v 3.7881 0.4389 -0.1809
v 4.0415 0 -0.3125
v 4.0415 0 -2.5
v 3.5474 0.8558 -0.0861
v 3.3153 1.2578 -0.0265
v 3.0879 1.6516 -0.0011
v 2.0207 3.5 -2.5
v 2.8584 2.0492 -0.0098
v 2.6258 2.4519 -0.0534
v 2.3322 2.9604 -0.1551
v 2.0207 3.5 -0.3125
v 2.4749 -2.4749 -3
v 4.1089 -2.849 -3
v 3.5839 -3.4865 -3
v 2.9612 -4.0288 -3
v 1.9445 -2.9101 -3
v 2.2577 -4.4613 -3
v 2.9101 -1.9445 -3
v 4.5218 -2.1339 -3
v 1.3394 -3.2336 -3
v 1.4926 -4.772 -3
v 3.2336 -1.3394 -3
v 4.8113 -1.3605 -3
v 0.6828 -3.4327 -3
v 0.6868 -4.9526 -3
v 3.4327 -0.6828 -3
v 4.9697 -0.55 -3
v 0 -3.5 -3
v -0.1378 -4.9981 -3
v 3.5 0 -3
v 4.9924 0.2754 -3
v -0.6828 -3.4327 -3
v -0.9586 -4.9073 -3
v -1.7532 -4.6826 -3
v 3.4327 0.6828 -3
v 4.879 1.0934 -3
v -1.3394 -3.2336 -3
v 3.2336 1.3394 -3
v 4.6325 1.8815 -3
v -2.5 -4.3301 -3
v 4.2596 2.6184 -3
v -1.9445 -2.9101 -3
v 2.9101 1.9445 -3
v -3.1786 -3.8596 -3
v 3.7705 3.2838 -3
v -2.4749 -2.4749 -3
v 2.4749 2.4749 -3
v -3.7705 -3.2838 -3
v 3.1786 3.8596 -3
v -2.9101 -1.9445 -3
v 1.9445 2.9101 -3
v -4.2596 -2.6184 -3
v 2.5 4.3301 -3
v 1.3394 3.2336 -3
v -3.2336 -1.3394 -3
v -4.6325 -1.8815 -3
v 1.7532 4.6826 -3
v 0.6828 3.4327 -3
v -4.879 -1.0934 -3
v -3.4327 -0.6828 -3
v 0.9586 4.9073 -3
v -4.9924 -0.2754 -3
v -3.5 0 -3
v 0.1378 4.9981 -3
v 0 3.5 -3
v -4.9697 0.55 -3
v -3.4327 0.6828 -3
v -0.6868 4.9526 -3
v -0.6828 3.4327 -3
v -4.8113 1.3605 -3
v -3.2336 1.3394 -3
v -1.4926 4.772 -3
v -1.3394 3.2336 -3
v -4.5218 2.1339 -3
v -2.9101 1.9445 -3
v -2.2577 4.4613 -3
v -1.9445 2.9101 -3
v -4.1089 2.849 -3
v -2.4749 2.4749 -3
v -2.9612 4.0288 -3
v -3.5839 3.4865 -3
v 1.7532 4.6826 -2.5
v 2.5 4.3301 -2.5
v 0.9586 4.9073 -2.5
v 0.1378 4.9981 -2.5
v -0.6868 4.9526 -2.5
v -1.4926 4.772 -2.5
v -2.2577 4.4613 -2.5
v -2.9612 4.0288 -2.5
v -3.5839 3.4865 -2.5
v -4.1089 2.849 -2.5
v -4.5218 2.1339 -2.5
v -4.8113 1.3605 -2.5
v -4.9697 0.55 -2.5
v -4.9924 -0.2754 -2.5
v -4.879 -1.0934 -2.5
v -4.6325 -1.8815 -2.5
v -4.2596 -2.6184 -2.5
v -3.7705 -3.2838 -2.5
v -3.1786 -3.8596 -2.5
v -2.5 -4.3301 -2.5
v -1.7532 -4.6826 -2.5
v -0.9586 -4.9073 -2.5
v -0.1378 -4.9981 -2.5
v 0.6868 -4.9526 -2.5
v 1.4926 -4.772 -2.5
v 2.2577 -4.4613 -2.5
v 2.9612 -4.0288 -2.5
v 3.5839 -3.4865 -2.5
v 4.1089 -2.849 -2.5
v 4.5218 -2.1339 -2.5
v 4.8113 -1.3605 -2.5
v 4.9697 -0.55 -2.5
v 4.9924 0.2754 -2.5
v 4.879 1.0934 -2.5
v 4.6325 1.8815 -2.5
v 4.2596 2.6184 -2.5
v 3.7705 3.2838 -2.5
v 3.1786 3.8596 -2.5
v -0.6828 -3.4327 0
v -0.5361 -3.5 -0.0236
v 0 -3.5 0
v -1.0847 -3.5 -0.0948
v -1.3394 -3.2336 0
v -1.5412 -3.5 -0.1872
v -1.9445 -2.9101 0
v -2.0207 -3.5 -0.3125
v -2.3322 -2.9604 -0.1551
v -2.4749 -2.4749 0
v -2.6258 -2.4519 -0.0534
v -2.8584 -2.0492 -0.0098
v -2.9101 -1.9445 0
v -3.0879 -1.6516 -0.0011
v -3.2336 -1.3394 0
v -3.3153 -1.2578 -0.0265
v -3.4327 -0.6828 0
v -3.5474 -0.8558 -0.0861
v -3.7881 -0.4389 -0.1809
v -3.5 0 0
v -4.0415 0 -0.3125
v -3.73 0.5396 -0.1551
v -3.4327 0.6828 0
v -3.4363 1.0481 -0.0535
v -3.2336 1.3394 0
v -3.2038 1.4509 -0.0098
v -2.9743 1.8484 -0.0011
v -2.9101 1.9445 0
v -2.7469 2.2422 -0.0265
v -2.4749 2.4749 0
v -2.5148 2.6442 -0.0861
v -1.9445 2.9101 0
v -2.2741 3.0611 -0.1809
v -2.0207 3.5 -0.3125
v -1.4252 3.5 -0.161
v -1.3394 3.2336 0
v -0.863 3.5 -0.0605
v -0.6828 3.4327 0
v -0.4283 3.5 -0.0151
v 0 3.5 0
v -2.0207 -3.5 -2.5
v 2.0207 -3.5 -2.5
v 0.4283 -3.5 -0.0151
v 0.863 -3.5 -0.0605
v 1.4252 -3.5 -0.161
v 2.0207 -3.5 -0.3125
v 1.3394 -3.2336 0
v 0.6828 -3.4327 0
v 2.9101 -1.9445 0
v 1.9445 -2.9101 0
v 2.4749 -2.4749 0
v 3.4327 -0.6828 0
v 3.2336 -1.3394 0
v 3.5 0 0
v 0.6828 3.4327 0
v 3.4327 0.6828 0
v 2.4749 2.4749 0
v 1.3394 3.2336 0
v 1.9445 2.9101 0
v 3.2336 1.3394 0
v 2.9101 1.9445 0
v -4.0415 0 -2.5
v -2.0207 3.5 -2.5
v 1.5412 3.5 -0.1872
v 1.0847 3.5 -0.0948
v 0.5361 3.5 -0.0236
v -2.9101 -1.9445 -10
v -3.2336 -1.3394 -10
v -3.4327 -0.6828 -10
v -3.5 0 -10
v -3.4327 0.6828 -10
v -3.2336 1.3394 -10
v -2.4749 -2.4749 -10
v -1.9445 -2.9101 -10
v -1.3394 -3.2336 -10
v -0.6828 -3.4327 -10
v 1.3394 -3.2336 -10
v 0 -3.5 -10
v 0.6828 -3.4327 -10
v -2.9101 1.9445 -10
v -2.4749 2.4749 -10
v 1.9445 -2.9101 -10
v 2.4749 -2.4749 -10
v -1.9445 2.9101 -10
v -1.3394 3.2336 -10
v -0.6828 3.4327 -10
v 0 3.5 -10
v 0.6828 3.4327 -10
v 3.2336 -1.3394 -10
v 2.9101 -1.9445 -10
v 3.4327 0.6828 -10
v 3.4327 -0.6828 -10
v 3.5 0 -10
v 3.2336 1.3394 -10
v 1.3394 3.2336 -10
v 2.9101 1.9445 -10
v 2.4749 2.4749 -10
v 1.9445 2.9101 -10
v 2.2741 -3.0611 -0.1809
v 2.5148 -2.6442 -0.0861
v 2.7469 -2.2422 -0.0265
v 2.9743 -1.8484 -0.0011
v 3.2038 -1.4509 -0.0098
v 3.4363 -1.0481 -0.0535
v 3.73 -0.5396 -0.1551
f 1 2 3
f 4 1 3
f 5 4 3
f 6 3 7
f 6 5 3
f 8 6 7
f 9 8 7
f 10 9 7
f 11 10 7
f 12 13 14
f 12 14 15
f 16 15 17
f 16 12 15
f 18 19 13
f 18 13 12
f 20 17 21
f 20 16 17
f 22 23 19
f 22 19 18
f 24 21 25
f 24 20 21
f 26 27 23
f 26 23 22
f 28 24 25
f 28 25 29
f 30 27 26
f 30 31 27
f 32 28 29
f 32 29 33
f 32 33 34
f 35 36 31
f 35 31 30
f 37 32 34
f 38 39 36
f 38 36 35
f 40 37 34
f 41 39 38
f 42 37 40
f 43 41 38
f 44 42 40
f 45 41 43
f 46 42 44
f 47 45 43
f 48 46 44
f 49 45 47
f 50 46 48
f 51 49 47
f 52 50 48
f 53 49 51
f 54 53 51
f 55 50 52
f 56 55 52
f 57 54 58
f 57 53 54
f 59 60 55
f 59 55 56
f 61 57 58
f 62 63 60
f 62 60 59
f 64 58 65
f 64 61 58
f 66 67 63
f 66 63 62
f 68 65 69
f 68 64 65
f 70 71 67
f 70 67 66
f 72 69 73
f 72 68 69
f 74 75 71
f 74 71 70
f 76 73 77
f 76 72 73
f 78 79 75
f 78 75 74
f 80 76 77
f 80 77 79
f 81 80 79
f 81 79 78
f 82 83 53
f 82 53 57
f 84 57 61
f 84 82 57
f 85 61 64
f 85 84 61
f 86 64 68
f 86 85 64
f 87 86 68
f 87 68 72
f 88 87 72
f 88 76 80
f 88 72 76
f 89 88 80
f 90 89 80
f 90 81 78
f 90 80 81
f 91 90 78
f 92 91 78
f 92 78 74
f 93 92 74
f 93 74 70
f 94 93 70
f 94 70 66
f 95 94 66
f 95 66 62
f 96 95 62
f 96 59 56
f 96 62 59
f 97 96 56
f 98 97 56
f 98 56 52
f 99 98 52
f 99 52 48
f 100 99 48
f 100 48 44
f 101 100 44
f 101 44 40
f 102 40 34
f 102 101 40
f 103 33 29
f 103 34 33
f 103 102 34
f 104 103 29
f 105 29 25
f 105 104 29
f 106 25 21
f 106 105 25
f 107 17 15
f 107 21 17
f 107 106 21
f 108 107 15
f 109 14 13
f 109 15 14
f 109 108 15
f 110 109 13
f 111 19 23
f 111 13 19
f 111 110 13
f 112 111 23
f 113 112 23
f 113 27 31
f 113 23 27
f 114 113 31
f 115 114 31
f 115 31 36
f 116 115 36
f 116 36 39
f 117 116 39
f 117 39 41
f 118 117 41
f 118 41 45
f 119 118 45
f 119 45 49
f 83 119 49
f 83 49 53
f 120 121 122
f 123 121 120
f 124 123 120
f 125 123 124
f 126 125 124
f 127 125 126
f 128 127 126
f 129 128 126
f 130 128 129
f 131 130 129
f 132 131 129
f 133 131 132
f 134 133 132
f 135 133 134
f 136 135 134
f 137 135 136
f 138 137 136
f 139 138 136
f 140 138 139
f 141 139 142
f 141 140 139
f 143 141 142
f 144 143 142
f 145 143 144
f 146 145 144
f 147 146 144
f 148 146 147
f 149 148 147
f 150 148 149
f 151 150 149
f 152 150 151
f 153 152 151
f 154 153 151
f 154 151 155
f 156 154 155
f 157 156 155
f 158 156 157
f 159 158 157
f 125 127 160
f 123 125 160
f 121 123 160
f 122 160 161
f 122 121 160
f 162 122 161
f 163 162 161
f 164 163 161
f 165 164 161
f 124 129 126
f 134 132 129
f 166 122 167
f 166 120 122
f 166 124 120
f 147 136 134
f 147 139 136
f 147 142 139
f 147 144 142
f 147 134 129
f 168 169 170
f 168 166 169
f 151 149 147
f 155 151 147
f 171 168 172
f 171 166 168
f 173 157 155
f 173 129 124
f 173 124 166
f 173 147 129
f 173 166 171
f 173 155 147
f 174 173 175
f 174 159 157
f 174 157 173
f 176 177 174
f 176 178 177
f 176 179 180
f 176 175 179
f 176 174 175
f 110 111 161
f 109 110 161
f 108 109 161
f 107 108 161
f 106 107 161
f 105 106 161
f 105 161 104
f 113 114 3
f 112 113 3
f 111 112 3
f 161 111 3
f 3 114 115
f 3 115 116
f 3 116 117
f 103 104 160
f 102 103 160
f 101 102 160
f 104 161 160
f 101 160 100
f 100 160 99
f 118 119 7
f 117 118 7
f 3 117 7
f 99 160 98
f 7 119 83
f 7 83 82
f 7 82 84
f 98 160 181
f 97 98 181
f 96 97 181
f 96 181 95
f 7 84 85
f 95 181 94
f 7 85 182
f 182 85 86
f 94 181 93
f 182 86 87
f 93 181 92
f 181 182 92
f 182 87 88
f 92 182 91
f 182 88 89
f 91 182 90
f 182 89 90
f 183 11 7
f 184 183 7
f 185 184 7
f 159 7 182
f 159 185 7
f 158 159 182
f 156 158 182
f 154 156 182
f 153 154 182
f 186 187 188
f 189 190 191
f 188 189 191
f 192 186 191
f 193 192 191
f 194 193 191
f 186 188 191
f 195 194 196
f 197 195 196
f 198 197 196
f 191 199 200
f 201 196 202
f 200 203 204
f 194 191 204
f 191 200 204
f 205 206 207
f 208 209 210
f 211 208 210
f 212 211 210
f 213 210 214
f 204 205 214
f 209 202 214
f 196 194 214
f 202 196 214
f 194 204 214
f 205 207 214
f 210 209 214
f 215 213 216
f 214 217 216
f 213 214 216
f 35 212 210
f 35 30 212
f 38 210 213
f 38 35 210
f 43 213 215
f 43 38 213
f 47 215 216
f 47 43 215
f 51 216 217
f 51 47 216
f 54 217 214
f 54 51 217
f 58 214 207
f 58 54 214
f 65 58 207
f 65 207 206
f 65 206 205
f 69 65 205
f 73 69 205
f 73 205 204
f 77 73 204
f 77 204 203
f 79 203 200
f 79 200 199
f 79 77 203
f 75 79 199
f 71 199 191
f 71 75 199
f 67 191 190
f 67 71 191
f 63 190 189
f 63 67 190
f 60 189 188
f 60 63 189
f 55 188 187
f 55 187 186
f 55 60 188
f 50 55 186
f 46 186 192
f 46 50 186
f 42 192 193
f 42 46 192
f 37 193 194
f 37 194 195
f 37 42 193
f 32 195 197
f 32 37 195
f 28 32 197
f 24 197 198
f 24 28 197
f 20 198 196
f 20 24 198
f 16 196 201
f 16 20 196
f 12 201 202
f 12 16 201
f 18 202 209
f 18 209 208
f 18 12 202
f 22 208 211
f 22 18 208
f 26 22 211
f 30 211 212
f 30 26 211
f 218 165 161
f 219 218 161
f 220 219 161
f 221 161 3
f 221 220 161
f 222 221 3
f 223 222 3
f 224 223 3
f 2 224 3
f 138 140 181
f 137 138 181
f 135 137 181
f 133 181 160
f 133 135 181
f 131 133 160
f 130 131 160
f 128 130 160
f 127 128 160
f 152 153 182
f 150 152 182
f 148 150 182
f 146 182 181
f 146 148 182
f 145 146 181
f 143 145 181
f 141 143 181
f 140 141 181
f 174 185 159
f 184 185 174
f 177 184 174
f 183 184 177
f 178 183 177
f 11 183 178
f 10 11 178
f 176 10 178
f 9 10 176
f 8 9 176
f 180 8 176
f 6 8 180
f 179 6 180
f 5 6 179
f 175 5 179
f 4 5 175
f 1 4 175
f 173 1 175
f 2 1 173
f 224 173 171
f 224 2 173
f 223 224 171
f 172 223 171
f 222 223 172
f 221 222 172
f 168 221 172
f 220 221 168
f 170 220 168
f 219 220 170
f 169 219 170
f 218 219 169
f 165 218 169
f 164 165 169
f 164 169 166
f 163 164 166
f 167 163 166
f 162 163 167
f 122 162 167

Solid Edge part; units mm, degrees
sketch "Sketch1" plane through (0, 0, 0) normal (0, 0, 1) x (1, 0, 0)
  line L0 (2.0207, -3.5) -> (4.0415, 0)
  line L1 (4.0415, 0) -> (2.0207, 3.5)
  line L2 (2.0207, 3.5) -> (-2.0207, 3.5)
  line L3 (-2.0207, 3.5) -> (-4.0415, 0)
  line L4 (-4.0415, 0) -> (-2.0207, -3.5)
  line L5 (-2.0207, -3.5) -> (2.0207, -3.5)
extrude "Protrusion1" add sketch "Sketch1" against normal blind 2.5
sketch "Sketch2" plane through (0, 0, 0) normal (0, -1, 0) x (1, 0, 0)
  line L0 (3.5, 0) -> (4.0415, -0.3125)
  line L1 (4.0415, -0.3125) -> (4.0415, 0)
  line L2 (4.0415, 0) -> (3.5, 0)
revolve "RevolvedCutout1" cut sketch "Sketch2" angle 360 about axis through (0, 0, 0.6231) along (0, 0, -1)
sketch "Sketch3" plane through (0, 0, -2.5) normal (0, 0, -1) x (0.5, 0.866, 0)
  circle A0 centre (0, 0) radius 5
extrude "ExtrudedProtrusion_2" add sketch "Sketch3" along normal blind 0.5
sketch "Sketch4" plane through (0, 0, 0) normal (0, 0, 1) x (1, 0, 0)
  circle A0 centre (0, 0) radius 3.5
extrude "ExtrudedProtrusion_3" add sketch "Sketch4" against normal blind 10
